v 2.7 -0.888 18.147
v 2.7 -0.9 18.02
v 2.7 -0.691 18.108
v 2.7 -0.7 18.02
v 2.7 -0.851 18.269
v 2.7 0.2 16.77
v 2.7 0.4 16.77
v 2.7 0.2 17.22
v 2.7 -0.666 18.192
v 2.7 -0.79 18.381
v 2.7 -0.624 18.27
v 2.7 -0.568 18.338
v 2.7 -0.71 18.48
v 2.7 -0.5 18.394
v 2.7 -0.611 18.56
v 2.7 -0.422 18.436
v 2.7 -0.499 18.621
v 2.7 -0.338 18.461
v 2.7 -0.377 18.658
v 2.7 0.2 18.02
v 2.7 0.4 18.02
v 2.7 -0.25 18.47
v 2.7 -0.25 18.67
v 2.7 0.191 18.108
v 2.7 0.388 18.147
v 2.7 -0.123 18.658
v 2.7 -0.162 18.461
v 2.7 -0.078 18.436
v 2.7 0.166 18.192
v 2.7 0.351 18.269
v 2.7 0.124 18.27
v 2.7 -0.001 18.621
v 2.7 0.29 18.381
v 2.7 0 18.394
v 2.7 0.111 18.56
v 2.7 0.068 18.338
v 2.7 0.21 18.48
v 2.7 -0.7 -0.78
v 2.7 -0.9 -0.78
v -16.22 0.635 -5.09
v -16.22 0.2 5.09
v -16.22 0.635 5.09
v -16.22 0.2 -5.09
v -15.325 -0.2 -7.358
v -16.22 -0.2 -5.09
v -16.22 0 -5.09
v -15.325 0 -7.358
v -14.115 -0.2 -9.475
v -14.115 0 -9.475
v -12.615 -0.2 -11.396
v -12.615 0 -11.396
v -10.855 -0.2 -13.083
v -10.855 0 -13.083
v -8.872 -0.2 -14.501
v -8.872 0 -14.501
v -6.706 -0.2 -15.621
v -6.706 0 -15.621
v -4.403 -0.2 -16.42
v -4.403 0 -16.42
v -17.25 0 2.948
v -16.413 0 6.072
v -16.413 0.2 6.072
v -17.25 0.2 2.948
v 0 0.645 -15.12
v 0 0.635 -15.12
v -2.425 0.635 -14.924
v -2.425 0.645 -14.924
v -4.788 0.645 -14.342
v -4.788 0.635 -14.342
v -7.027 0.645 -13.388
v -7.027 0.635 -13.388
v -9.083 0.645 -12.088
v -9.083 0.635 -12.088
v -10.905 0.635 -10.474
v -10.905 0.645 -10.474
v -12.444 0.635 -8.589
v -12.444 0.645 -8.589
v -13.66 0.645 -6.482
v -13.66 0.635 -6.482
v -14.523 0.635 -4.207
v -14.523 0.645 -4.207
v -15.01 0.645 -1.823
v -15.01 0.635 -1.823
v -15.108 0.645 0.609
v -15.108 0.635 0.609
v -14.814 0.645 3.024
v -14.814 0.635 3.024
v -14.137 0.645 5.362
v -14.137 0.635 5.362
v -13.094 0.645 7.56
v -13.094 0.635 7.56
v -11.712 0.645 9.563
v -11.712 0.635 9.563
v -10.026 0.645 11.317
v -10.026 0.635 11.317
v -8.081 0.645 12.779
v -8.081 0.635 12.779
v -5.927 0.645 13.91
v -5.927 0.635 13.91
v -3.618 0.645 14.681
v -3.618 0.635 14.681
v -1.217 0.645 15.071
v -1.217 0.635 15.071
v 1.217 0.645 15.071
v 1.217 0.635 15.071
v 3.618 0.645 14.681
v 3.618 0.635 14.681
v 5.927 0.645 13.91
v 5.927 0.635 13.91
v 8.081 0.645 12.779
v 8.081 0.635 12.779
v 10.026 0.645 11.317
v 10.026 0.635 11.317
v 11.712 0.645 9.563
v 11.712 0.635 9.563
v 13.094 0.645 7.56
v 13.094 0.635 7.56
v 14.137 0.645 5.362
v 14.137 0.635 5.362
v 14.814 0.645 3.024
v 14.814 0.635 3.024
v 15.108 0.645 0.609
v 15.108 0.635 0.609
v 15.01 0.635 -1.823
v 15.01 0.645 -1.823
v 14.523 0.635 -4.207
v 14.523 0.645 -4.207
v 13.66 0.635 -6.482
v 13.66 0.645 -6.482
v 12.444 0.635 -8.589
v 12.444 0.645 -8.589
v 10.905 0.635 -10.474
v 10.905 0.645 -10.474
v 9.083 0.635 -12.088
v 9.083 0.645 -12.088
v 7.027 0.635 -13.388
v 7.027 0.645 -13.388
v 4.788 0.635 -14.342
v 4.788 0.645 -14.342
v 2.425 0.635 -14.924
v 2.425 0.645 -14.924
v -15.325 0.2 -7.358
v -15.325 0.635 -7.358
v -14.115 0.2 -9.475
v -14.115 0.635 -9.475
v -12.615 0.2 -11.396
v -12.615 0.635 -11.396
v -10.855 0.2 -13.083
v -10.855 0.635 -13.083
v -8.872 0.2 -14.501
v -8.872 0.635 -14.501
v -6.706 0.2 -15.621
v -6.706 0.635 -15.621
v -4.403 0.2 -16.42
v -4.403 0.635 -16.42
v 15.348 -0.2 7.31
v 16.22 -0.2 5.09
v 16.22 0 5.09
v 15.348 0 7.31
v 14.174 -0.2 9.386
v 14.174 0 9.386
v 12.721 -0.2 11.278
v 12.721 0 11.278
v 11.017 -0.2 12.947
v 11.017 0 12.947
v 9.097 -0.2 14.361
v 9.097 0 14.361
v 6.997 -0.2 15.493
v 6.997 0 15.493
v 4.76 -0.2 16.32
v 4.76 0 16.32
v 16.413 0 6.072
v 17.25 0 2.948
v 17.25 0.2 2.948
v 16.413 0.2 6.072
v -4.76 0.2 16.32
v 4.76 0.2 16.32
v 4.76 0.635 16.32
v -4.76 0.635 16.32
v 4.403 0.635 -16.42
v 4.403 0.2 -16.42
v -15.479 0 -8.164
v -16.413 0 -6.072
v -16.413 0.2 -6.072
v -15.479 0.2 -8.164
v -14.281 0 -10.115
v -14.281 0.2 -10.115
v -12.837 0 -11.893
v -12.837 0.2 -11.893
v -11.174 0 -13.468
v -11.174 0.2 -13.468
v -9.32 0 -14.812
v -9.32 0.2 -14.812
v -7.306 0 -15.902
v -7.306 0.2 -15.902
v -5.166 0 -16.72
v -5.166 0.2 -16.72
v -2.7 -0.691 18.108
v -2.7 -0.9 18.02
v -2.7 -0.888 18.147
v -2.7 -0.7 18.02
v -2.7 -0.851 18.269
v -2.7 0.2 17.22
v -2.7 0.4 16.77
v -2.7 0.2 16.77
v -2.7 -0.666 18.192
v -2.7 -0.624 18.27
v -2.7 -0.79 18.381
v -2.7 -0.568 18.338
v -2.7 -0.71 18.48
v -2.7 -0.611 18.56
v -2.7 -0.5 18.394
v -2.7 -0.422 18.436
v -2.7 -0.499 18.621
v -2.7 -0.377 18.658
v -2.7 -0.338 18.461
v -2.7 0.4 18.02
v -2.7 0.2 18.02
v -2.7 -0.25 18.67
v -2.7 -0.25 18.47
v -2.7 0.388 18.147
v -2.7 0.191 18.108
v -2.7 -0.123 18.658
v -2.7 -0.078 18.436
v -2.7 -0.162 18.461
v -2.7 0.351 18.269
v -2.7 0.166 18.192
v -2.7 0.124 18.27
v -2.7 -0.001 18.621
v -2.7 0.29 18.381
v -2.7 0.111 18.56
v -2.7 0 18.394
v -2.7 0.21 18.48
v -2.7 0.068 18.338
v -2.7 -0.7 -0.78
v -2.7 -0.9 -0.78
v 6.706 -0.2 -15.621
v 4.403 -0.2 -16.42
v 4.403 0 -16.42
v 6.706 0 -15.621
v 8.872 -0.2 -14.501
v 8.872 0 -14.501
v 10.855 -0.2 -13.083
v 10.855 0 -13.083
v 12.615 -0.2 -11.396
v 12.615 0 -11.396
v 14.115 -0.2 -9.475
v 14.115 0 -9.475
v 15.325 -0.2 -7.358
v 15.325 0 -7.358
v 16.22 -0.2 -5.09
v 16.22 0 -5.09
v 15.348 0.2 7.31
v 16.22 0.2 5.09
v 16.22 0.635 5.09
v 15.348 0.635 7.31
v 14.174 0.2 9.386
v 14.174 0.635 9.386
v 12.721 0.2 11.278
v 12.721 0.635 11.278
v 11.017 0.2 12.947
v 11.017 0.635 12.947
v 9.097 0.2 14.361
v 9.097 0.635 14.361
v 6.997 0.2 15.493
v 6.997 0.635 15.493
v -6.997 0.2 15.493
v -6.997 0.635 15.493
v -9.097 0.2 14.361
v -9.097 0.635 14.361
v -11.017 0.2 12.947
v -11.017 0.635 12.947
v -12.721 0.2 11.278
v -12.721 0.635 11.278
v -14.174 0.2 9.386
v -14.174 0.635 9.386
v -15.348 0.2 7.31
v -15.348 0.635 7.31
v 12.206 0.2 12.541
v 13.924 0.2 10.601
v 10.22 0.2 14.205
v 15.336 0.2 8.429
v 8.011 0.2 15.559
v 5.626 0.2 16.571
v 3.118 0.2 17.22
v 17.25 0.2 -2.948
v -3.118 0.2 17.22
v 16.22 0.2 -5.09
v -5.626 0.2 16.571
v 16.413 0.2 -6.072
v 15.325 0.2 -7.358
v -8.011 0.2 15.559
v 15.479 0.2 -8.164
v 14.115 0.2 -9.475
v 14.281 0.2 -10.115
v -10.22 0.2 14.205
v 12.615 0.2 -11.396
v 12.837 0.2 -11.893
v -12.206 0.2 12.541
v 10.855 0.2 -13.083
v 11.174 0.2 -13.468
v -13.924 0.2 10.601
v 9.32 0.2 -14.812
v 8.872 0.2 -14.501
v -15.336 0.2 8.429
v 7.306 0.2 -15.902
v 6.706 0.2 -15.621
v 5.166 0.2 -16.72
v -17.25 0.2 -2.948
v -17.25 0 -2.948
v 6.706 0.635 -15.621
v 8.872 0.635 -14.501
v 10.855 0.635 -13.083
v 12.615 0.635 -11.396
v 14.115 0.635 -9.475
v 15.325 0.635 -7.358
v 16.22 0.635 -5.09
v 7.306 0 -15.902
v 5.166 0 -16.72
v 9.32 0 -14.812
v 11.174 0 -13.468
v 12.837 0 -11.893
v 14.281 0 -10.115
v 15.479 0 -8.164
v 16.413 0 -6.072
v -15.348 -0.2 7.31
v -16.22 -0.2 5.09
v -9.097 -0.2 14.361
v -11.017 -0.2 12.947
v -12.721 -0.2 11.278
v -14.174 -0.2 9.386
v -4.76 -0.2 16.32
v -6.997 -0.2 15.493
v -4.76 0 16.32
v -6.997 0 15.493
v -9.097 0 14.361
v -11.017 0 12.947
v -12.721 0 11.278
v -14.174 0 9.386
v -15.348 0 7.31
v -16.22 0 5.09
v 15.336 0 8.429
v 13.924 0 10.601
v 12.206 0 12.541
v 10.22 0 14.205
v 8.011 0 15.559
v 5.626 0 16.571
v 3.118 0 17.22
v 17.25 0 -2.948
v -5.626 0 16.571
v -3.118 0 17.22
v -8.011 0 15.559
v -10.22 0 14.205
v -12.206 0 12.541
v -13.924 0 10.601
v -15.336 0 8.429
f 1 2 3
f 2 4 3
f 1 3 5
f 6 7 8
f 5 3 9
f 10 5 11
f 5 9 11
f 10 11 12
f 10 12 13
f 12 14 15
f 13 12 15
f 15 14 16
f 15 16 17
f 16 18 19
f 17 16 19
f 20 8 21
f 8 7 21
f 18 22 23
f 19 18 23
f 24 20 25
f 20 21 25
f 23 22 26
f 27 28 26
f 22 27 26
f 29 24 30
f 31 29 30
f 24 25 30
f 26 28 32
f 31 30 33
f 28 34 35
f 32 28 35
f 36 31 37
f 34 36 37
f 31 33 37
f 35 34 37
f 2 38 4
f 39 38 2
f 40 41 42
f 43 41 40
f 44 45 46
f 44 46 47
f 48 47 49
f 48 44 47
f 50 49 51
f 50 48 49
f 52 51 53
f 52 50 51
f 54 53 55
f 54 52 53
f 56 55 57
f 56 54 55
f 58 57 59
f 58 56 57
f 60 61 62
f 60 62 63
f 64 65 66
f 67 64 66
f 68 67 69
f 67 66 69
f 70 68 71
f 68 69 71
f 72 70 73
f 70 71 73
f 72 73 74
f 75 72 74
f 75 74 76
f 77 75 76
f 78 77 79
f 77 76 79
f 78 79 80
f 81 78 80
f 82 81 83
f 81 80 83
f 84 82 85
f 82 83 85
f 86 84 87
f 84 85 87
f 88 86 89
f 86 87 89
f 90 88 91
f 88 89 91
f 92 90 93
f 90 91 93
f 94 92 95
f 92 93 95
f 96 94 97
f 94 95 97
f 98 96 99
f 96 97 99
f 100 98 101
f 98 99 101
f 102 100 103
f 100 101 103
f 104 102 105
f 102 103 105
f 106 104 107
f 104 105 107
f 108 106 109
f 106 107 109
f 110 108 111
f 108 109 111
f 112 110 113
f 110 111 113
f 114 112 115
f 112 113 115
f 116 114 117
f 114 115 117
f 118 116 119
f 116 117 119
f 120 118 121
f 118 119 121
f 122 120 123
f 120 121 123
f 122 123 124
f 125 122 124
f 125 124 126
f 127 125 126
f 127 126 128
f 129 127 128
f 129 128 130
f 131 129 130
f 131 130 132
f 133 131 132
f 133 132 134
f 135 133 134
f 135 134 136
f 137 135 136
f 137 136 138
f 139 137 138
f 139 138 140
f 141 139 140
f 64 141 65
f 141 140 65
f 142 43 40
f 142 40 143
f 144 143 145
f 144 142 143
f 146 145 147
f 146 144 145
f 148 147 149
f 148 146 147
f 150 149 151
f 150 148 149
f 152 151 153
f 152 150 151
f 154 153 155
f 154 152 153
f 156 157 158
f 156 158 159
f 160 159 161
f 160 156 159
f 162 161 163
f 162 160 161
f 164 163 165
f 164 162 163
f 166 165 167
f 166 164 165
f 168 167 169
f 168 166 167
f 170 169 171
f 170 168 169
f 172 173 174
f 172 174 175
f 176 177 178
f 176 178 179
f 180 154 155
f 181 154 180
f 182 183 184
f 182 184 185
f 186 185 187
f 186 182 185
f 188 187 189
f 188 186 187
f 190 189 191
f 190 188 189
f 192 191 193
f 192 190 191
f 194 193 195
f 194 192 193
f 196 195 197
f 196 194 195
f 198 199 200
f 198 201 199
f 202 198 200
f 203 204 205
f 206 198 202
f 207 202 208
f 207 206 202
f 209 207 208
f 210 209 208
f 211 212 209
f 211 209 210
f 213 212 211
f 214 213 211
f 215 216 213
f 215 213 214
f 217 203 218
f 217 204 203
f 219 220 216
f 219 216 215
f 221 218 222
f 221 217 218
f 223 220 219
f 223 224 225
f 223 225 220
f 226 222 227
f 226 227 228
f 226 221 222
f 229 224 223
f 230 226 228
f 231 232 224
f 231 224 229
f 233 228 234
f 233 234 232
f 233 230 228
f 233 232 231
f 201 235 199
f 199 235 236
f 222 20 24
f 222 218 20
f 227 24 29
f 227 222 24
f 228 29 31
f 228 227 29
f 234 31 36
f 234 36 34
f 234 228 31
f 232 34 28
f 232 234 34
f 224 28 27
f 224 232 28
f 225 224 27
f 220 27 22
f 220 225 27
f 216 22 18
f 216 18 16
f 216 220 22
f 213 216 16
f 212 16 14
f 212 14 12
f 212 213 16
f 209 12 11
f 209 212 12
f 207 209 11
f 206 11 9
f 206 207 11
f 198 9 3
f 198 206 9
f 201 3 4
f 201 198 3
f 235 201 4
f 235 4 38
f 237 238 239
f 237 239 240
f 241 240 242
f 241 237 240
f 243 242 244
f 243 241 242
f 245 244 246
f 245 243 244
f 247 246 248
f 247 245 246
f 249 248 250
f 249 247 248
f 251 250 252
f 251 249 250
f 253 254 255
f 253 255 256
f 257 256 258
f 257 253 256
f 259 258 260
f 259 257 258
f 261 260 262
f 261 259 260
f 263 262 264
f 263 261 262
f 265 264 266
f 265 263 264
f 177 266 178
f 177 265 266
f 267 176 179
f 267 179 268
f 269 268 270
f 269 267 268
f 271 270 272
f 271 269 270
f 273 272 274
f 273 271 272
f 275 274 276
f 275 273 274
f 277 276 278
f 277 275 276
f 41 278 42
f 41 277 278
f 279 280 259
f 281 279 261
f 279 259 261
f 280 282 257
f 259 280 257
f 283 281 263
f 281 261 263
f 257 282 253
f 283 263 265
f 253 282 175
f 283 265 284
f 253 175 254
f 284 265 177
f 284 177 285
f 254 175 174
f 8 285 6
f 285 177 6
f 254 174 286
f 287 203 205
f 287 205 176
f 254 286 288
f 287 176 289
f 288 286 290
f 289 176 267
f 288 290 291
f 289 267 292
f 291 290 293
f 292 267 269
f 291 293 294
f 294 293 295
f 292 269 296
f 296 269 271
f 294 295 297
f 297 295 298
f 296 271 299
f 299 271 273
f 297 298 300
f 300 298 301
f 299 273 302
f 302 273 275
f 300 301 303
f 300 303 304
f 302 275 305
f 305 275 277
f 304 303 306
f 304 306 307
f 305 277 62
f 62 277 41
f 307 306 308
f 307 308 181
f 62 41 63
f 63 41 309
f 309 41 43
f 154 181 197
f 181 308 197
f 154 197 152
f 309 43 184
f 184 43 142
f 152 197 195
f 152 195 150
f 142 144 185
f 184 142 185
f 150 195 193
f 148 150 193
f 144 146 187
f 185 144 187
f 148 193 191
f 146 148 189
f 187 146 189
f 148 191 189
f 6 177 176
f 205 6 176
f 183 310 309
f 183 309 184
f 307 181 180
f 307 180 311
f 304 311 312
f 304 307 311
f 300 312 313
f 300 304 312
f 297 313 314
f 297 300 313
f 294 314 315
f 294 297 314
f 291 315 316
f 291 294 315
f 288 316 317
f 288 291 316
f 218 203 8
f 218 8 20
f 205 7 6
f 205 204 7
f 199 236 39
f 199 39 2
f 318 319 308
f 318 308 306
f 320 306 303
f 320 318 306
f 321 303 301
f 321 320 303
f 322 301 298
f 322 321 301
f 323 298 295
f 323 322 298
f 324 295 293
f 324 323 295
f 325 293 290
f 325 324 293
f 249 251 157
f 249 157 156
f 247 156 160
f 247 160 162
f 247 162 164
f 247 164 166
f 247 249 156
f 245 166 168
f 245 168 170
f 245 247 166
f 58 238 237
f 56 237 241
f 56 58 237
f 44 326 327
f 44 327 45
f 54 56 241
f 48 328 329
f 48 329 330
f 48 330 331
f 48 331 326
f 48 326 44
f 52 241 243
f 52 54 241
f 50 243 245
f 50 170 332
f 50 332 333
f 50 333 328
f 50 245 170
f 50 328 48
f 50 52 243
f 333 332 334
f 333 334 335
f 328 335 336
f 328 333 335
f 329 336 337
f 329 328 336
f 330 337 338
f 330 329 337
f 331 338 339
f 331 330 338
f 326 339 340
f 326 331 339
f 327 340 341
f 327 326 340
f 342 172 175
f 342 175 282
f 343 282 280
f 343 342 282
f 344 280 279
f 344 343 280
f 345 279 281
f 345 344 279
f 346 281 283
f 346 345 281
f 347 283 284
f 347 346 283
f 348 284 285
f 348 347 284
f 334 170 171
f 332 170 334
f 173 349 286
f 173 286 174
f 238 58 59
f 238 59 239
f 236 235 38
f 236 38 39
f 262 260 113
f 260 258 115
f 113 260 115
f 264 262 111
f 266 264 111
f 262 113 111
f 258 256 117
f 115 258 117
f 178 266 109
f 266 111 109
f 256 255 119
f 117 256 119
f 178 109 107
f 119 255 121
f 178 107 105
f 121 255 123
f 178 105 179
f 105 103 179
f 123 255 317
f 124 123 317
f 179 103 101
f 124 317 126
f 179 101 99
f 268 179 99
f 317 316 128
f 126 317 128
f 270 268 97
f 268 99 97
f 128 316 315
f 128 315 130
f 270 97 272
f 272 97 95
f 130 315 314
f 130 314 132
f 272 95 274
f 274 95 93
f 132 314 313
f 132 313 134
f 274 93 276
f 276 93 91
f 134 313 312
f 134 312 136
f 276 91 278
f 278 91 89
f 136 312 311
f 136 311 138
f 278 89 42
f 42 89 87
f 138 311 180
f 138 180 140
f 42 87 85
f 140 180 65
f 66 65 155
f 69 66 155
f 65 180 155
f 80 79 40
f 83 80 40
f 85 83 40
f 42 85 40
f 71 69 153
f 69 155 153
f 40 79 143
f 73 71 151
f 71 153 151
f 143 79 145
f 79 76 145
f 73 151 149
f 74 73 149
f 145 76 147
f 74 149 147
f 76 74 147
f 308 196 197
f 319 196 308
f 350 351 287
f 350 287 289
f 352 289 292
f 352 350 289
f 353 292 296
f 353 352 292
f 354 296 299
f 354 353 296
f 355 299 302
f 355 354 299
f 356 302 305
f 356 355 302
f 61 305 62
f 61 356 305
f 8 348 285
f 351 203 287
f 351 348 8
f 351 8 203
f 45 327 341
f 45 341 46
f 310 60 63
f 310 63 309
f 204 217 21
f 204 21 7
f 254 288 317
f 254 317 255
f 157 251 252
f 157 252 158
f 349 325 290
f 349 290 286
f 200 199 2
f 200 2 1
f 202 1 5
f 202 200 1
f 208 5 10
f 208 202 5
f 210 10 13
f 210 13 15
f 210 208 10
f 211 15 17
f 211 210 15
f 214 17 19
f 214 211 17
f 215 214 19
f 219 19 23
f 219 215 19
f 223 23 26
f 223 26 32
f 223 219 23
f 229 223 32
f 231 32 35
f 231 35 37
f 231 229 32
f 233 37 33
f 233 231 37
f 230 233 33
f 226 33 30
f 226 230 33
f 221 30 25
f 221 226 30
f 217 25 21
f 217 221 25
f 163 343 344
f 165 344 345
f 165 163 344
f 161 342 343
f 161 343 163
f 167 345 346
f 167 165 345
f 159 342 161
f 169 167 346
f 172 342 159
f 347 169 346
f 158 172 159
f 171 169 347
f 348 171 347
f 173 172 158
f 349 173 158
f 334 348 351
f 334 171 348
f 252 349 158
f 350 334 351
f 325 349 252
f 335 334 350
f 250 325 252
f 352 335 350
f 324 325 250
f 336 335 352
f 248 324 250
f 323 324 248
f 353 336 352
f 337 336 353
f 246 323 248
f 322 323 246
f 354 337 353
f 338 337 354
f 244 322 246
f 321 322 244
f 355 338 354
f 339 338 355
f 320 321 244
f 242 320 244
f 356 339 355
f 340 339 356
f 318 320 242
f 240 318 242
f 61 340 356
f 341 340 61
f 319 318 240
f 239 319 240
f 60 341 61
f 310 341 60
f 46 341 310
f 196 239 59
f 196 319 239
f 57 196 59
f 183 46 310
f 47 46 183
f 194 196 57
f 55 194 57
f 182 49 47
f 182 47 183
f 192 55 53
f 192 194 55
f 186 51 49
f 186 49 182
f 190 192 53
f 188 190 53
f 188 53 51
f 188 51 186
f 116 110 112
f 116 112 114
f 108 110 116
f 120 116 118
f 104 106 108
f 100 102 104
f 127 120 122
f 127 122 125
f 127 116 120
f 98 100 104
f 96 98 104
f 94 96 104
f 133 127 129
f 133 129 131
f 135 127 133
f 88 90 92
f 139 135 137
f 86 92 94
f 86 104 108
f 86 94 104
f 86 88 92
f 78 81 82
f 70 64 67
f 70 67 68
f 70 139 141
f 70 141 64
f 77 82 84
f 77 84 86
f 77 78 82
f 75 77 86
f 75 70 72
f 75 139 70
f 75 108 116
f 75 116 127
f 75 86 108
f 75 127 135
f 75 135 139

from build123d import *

# Parameters (mm, degrees)
BOSS_EXTRUDE1_DEPTH = 0.2
BOSS_EXTRUDE5_DEPTH = 0.435
SKETCH5_R           = 15.12
BOSS_EXTRUDE6_DEPTH = 0.01
LPATTERN1_COUNT     = 2
LPATTERN1_PITCH     = 0.4
BOSS_EXTRUDE7_DEPTH = 2.7


with BuildPart() as part:
    # Sketch1 → Boss-Extrude1 (new body)
    with BuildSketch(Plane(origin=(0, 0, 0), x_dir=(1, 0, 0), z_dir=(0, 1, 0))):
        with BuildLine():
            Line((17.249992572, 2.9475), (17.249992572, -2.9475))
            Line((17.249992572, -2.9475), (16.412681783, -6.072386409))
            ThreePointArc((16.412681783, -6.072386409), (11.243979481, -13.409807061), (3.117762689, -17.22003356))
            Line((3.117762689, -17.22003356), (-3.117762689, -17.22003356))
            ThreePointArc((-3.117762689, -17.22003356), (-11.243979481, -13.409807061), (-16.412681783, -6.072386409))
            Line((-16.412681783, -6.072386409), (-17.249992572, -2.9475))
            Line((-17.249992572, -2.9475), (-17.249992572, 2.9475))
            Line((-17.249992572, 2.9475), (-16.412681783, 6.072386409))
            ThreePointArc((-16.412681783, 6.072386409), (-12.031542367, 12.707949806), (-5.1665, 16.71996644))
            Line((-5.1665, 16.71996644), (5.1665, 16.71996644))
            ThreePointArc((5.1665, 16.71996644), (12.031542367, 12.707949806), (16.412681783, 6.072386409))
            Line((16.412681783, 6.072386409), (17.249992572, 2.9475))
        make_face()
    extrude(amount=BOSS_EXTRUDE1_DEPTH)

    # Sketch2 → Boss-Extrude5 (add)
    with BuildSketch(Plane(origin=(0, 0.2, 0), x_dir=(1, 0, 0), z_dir=(0, 1, 0))):
        with BuildLine():
            Line((-4.402806164, 16.41996644), (4.402806164, 16.41996644))
            ThreePointArc((4.402806164, 16.41996644), (11.764995572, 12.271303076), (16.22, 5.0903438))
            Line((16.22, 5.0903438), (16.22, -5.0903438))
            ThreePointArc((16.22, -5.0903438), (11.898124894, -12.142266016), (4.759884935, -16.32003356))
            Line((4.759884935, -16.32003356), (-4.759884935, -16.32003356))
            ThreePointArc((-4.759884935, -16.32003356), (-11.898124894, -12.142266016), (-16.22, -5.0903438))
            Line((-16.22, -5.0903438), (-16.22, 5.0903438))
            ThreePointArc((-16.22, 5.0903438), (-11.764995572, 12.271303076), (-4.402806164, 16.41996644))
        make_face()
    boss_extrude5 = extrude(amount=BOSS_EXTRUDE5_DEPTH)

    # Sketch5 → Boss-Extrude6 (add)
    with BuildSketch(Plane(origin=(0, 0.635, 0), x_dir=(1, 0, 0), z_dir=(0, 1, 0))):
        with Locations(Location((0, 0, 0), (0, 0, 90))):
            Circle(SKETCH5_R)
    extrude(amount=BOSS_EXTRUDE6_DEPTH)

    # LPattern1: Boss-Extrude5 ×2
    with Locations(*[(0, -i * LPATTERN1_PITCH, 0) for i in range(1, LPATTERN1_COUNT)]):
        add(boss_extrude5)

    # Sketch6 → Boss-Extrude7 (add, symmetric)
    with BuildSketch(Plane.ZY):
        with BuildLine():
            Line((17.22003356, 0.2), (18.02003356, 0.2))
            ThreePointArc((18.02003356, 0.2), (18.47003356, -0.25), (18.02003356, -0.7))
            Line((18.02003356, -0.7), (-0.77996644, -0.7))
            Line((-0.77996644, -0.7), (-0.77996644, -0.9))
            Line((-0.77996644, -0.9), (18.02003356, -0.9))
            ThreePointArc((18.02003356, -0.9), (18.67003356, -0.25), (18.02003356, 0.4))
            Line((18.02003356, 0.4), (16.77003356, 0.4))
            Line((16.77003356, 0.4), (16.77003356, 0.2))
            Line((16.77003356, 0.2), (17.22003356, 0.2))
        make_face()
    extrude(amount=BOSS_EXTRUDE7_DEPTH, both=True)


solid = part.part
